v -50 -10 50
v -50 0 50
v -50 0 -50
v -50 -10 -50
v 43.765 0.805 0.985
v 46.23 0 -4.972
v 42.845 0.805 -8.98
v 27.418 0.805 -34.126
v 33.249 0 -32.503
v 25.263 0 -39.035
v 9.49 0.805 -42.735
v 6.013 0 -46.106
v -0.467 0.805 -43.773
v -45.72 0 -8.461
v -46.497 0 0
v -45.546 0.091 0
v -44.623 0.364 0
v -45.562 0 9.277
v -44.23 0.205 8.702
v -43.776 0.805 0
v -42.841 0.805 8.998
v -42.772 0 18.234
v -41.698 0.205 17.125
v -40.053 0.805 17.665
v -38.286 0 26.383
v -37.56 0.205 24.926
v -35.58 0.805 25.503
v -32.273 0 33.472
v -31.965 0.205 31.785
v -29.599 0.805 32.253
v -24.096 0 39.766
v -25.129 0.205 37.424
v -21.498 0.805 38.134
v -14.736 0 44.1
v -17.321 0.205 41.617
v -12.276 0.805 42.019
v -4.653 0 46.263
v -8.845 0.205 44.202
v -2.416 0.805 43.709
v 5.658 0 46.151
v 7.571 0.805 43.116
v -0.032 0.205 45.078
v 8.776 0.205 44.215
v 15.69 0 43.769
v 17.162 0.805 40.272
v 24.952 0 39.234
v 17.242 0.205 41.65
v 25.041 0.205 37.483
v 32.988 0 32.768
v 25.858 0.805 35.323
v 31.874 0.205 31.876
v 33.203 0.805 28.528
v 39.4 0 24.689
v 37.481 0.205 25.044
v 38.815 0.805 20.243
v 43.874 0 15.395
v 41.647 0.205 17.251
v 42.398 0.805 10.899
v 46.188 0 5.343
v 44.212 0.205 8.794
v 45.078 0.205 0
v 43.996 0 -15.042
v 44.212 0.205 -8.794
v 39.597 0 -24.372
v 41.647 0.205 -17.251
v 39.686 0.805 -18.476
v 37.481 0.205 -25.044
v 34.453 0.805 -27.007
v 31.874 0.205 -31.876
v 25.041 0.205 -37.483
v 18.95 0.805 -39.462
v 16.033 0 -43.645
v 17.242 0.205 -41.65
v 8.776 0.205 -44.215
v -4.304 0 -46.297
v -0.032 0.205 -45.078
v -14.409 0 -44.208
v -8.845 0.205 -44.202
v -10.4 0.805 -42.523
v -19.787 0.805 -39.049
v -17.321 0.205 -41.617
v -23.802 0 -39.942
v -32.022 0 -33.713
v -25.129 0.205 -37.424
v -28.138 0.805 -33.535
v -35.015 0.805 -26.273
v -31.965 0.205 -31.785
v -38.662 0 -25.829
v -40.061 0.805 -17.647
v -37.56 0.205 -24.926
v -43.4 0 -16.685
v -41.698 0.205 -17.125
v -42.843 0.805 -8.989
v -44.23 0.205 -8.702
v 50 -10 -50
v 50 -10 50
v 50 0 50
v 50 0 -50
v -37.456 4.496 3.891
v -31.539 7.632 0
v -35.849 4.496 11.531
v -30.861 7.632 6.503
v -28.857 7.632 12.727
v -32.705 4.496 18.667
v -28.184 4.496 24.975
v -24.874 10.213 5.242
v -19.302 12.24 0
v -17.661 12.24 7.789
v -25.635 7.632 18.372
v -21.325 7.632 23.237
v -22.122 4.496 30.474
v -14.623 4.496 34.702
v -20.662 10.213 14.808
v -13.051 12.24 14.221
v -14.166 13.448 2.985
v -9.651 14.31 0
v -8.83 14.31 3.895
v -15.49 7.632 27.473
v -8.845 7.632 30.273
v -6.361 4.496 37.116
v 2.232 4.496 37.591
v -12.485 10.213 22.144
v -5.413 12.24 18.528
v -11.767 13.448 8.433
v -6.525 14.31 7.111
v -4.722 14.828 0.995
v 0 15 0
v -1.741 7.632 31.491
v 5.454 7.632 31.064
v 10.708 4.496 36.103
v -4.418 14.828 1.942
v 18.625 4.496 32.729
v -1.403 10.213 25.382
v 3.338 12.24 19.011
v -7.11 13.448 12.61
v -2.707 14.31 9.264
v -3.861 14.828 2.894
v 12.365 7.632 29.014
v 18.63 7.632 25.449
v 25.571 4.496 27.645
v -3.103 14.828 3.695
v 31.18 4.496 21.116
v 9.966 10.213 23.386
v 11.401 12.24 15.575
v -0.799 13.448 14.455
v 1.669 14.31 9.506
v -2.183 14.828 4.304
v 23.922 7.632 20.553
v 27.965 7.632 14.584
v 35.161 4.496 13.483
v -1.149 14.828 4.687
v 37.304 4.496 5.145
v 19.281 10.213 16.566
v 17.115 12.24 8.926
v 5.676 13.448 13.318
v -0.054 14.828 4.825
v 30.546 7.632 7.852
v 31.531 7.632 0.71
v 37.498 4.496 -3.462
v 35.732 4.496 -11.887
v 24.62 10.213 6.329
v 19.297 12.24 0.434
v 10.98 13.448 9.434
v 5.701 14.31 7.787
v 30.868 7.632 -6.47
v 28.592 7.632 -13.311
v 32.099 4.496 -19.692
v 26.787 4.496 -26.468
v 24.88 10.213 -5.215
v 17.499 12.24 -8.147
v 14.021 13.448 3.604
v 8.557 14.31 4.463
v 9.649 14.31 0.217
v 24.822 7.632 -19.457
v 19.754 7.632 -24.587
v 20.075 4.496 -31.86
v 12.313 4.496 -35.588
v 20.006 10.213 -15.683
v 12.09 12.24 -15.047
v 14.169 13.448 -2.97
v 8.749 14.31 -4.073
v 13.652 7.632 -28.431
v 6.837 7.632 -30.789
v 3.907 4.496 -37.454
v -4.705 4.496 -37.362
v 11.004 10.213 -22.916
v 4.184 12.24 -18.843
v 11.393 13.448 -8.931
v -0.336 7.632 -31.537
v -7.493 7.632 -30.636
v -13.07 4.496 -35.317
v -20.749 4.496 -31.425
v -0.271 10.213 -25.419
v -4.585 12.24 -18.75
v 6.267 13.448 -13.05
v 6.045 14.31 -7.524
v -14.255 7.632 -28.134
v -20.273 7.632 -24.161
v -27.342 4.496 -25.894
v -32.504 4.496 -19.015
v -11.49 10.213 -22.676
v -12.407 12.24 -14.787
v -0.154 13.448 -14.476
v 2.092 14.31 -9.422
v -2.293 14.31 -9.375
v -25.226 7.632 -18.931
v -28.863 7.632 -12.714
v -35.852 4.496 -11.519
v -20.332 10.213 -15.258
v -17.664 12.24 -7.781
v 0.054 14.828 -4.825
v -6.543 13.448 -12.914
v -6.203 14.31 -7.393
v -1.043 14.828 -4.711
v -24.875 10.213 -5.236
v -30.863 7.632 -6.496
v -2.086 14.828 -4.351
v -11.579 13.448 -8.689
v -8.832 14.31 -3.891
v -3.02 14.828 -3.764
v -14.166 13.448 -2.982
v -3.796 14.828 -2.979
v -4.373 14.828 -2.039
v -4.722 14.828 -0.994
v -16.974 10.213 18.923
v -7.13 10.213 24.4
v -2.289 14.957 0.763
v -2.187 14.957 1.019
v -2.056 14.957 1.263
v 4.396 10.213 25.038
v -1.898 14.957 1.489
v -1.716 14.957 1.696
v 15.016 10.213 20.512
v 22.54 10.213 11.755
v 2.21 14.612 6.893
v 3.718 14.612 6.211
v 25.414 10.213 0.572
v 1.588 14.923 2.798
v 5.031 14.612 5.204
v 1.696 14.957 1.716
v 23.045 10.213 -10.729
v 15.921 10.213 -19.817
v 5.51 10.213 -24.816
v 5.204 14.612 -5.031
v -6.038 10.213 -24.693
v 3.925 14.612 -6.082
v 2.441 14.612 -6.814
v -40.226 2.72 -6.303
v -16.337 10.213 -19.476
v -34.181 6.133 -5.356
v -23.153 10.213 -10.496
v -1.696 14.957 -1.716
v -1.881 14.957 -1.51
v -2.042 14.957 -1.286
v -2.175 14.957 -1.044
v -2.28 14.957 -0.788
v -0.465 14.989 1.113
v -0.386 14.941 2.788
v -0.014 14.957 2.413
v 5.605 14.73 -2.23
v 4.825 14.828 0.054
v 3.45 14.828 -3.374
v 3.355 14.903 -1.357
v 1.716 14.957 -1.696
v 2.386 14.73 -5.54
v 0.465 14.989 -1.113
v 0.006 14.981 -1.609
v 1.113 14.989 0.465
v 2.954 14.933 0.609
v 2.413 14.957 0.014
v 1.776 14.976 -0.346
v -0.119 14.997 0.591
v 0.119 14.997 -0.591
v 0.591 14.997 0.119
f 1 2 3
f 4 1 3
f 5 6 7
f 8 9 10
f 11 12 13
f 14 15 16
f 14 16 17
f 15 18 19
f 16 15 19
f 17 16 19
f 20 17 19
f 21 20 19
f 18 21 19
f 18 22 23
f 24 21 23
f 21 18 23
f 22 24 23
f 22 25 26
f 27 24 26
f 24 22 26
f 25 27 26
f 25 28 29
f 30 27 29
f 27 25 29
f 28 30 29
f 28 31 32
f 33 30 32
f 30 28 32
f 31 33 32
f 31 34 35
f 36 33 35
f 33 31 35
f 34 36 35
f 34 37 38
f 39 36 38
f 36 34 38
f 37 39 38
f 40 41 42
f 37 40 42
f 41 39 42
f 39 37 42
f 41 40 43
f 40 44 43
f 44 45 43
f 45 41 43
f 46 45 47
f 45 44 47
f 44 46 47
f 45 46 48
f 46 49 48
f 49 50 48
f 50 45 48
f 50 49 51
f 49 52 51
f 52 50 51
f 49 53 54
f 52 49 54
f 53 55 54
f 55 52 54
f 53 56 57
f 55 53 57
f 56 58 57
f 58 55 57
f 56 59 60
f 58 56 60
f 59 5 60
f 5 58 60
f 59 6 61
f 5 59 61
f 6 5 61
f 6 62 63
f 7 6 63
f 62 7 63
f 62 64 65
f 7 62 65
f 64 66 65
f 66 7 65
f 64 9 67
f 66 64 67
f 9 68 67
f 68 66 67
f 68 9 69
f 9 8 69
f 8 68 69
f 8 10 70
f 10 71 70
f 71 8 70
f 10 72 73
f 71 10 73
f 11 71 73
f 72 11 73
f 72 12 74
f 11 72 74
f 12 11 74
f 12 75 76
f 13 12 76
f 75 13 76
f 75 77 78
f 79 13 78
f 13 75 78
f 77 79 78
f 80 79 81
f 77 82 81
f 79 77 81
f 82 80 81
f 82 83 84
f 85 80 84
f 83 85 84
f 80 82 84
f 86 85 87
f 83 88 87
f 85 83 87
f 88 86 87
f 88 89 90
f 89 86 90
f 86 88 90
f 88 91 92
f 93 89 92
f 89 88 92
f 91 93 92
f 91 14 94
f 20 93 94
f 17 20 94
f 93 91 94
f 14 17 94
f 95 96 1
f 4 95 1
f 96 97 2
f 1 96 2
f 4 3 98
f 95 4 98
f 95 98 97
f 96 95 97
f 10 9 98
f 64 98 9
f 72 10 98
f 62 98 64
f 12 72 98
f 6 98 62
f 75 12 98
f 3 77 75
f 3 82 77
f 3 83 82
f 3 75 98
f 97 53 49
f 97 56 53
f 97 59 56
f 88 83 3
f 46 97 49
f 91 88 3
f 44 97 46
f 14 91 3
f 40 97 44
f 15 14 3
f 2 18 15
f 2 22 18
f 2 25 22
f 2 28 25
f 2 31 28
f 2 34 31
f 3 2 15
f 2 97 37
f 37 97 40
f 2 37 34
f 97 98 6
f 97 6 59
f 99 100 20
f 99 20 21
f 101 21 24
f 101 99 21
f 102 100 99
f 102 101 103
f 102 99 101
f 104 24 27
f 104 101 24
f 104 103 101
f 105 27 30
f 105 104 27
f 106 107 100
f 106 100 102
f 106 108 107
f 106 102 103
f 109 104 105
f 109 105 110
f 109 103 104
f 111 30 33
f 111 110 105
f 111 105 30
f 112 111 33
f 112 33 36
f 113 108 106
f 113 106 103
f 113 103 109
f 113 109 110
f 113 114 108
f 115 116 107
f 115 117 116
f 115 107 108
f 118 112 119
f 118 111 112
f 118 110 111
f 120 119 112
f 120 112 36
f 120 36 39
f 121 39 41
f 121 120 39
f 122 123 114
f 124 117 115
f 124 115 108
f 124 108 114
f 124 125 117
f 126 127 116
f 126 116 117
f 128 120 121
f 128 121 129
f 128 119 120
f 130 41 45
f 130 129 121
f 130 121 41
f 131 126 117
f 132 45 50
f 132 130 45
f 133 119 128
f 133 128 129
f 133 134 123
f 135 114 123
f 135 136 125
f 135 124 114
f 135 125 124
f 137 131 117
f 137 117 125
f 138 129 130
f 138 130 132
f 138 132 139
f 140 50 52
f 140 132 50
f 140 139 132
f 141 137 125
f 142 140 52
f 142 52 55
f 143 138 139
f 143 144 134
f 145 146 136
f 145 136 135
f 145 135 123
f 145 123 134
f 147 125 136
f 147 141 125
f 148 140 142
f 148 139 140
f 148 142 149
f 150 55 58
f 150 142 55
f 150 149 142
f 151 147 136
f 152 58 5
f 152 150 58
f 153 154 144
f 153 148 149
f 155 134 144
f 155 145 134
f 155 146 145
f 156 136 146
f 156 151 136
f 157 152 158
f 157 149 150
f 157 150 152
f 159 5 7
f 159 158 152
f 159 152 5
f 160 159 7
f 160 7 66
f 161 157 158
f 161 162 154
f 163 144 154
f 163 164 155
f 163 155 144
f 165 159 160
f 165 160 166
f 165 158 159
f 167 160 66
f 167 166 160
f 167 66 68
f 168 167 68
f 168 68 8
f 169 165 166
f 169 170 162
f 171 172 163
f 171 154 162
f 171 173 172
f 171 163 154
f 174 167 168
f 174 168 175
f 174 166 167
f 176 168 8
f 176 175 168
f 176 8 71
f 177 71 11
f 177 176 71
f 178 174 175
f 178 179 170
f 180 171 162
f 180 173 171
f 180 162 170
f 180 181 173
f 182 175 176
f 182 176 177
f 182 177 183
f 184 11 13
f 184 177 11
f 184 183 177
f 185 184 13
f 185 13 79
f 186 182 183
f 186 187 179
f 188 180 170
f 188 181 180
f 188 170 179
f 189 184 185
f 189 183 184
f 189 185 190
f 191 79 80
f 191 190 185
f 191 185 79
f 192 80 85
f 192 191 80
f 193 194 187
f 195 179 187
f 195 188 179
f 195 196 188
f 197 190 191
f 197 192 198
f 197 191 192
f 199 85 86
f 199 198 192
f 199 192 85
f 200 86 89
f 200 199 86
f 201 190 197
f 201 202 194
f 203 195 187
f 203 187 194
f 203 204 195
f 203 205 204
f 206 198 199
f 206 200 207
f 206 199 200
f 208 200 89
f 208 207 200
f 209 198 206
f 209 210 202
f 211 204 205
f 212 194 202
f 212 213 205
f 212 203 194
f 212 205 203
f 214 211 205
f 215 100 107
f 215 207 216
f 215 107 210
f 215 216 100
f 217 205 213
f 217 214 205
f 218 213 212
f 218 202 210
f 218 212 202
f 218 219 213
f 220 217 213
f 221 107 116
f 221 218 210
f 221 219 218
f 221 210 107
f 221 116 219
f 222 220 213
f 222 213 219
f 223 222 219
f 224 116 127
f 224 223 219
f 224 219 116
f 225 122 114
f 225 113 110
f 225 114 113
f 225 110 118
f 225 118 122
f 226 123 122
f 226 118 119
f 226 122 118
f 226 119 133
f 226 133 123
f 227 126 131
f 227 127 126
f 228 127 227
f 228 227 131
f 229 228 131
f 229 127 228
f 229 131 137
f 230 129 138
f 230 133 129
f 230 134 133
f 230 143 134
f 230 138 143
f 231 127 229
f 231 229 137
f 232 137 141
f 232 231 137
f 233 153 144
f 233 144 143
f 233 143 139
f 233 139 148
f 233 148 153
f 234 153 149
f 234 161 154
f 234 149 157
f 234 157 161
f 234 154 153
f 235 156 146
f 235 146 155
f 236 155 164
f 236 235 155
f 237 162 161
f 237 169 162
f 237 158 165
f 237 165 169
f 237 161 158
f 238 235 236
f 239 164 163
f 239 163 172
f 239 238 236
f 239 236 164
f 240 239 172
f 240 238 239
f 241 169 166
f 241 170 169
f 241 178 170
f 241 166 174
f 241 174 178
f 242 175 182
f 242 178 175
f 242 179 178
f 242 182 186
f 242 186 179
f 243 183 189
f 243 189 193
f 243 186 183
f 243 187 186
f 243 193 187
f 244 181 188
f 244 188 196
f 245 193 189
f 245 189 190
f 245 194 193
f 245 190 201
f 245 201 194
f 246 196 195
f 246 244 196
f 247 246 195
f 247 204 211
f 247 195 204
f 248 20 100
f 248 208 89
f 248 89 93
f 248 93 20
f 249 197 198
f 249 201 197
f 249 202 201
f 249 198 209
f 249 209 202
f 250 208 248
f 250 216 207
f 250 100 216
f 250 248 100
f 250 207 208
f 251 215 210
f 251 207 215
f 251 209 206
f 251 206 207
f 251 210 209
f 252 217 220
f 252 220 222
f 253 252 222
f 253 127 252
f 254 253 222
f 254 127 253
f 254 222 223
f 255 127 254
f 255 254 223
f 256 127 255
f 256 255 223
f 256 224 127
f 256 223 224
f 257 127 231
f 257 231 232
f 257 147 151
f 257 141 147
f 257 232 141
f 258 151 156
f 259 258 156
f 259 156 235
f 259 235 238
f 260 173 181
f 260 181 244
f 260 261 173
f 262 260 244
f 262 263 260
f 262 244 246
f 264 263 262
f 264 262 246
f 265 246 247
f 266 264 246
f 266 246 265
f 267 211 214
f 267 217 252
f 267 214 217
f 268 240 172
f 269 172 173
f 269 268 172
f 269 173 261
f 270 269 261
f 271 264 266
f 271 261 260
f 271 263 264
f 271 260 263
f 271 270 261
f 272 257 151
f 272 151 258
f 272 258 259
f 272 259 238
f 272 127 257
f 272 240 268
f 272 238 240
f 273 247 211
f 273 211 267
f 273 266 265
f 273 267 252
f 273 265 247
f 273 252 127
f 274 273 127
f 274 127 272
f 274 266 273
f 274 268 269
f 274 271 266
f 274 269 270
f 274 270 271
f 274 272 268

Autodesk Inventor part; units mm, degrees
ref_plane "YZ Plane" through (0, 0, 0) normal (1, 0, 0) x (0, 1, 0)
ref_plane "XZ Plane" through (0, 0, 0) normal (0, 1, 0) x (-1, 0, 0)
ref_plane "XY Plane" through (0, 0, 0) normal (0, 0, 1) x (1, 0, 0)
sketch "Sketch1" plane through (0, 0, 0) normal (0, 1, 0) x (-1, 0, 0)
  line L0 (-50, 50) -> (50, 50)
  line L1 (50, 50) -> (50, -50)
  line L2 (50, -50) -> (-50, -50)
  line L3 (-50, -50) -> (-50, 50)
  line L4 (-50, 50) -> (50, -50) construction
  line L5 (50, 50) -> (-50, -50) construction
  point P0 (0, 0)
  dimension "d0" = 100
sketch "Sketch2" plane through (0, 0, 0) normal (0, 0, 1) x (1, 0, 0)
  line L0 (0, -6.18) -> (0, 36.03) projected
  line L1 (50, 0) -> (-50, 0) projected
  line L2 (-45, 0) -> (0, 30) construction
  line L3 (0, 30) -> (45, 0) construction
  spline S0 degree 2 poles (-45, 0) (0, 30) (45, 0) knots 1 1 1 2 2 2
  point P0 (0, 0)
  point P1 (0, 0)
  point P2 (0, 15)
  dimension "d1" = 30
  dimension "d2" = 5
extrude "Extrusion1" add sketch "Sketch1" against normal blind 10
revolve "Revolution2" add sketch "Sketch2" angle 360 about axis through (0, -10, 0) along (0, 1, 0) picked at (-26.1787, 2.223) contours L1 S0 L0
fillet "Fillet1" radius 5 1 edges at (45, 0, 0)
properties part number "Surface1"
